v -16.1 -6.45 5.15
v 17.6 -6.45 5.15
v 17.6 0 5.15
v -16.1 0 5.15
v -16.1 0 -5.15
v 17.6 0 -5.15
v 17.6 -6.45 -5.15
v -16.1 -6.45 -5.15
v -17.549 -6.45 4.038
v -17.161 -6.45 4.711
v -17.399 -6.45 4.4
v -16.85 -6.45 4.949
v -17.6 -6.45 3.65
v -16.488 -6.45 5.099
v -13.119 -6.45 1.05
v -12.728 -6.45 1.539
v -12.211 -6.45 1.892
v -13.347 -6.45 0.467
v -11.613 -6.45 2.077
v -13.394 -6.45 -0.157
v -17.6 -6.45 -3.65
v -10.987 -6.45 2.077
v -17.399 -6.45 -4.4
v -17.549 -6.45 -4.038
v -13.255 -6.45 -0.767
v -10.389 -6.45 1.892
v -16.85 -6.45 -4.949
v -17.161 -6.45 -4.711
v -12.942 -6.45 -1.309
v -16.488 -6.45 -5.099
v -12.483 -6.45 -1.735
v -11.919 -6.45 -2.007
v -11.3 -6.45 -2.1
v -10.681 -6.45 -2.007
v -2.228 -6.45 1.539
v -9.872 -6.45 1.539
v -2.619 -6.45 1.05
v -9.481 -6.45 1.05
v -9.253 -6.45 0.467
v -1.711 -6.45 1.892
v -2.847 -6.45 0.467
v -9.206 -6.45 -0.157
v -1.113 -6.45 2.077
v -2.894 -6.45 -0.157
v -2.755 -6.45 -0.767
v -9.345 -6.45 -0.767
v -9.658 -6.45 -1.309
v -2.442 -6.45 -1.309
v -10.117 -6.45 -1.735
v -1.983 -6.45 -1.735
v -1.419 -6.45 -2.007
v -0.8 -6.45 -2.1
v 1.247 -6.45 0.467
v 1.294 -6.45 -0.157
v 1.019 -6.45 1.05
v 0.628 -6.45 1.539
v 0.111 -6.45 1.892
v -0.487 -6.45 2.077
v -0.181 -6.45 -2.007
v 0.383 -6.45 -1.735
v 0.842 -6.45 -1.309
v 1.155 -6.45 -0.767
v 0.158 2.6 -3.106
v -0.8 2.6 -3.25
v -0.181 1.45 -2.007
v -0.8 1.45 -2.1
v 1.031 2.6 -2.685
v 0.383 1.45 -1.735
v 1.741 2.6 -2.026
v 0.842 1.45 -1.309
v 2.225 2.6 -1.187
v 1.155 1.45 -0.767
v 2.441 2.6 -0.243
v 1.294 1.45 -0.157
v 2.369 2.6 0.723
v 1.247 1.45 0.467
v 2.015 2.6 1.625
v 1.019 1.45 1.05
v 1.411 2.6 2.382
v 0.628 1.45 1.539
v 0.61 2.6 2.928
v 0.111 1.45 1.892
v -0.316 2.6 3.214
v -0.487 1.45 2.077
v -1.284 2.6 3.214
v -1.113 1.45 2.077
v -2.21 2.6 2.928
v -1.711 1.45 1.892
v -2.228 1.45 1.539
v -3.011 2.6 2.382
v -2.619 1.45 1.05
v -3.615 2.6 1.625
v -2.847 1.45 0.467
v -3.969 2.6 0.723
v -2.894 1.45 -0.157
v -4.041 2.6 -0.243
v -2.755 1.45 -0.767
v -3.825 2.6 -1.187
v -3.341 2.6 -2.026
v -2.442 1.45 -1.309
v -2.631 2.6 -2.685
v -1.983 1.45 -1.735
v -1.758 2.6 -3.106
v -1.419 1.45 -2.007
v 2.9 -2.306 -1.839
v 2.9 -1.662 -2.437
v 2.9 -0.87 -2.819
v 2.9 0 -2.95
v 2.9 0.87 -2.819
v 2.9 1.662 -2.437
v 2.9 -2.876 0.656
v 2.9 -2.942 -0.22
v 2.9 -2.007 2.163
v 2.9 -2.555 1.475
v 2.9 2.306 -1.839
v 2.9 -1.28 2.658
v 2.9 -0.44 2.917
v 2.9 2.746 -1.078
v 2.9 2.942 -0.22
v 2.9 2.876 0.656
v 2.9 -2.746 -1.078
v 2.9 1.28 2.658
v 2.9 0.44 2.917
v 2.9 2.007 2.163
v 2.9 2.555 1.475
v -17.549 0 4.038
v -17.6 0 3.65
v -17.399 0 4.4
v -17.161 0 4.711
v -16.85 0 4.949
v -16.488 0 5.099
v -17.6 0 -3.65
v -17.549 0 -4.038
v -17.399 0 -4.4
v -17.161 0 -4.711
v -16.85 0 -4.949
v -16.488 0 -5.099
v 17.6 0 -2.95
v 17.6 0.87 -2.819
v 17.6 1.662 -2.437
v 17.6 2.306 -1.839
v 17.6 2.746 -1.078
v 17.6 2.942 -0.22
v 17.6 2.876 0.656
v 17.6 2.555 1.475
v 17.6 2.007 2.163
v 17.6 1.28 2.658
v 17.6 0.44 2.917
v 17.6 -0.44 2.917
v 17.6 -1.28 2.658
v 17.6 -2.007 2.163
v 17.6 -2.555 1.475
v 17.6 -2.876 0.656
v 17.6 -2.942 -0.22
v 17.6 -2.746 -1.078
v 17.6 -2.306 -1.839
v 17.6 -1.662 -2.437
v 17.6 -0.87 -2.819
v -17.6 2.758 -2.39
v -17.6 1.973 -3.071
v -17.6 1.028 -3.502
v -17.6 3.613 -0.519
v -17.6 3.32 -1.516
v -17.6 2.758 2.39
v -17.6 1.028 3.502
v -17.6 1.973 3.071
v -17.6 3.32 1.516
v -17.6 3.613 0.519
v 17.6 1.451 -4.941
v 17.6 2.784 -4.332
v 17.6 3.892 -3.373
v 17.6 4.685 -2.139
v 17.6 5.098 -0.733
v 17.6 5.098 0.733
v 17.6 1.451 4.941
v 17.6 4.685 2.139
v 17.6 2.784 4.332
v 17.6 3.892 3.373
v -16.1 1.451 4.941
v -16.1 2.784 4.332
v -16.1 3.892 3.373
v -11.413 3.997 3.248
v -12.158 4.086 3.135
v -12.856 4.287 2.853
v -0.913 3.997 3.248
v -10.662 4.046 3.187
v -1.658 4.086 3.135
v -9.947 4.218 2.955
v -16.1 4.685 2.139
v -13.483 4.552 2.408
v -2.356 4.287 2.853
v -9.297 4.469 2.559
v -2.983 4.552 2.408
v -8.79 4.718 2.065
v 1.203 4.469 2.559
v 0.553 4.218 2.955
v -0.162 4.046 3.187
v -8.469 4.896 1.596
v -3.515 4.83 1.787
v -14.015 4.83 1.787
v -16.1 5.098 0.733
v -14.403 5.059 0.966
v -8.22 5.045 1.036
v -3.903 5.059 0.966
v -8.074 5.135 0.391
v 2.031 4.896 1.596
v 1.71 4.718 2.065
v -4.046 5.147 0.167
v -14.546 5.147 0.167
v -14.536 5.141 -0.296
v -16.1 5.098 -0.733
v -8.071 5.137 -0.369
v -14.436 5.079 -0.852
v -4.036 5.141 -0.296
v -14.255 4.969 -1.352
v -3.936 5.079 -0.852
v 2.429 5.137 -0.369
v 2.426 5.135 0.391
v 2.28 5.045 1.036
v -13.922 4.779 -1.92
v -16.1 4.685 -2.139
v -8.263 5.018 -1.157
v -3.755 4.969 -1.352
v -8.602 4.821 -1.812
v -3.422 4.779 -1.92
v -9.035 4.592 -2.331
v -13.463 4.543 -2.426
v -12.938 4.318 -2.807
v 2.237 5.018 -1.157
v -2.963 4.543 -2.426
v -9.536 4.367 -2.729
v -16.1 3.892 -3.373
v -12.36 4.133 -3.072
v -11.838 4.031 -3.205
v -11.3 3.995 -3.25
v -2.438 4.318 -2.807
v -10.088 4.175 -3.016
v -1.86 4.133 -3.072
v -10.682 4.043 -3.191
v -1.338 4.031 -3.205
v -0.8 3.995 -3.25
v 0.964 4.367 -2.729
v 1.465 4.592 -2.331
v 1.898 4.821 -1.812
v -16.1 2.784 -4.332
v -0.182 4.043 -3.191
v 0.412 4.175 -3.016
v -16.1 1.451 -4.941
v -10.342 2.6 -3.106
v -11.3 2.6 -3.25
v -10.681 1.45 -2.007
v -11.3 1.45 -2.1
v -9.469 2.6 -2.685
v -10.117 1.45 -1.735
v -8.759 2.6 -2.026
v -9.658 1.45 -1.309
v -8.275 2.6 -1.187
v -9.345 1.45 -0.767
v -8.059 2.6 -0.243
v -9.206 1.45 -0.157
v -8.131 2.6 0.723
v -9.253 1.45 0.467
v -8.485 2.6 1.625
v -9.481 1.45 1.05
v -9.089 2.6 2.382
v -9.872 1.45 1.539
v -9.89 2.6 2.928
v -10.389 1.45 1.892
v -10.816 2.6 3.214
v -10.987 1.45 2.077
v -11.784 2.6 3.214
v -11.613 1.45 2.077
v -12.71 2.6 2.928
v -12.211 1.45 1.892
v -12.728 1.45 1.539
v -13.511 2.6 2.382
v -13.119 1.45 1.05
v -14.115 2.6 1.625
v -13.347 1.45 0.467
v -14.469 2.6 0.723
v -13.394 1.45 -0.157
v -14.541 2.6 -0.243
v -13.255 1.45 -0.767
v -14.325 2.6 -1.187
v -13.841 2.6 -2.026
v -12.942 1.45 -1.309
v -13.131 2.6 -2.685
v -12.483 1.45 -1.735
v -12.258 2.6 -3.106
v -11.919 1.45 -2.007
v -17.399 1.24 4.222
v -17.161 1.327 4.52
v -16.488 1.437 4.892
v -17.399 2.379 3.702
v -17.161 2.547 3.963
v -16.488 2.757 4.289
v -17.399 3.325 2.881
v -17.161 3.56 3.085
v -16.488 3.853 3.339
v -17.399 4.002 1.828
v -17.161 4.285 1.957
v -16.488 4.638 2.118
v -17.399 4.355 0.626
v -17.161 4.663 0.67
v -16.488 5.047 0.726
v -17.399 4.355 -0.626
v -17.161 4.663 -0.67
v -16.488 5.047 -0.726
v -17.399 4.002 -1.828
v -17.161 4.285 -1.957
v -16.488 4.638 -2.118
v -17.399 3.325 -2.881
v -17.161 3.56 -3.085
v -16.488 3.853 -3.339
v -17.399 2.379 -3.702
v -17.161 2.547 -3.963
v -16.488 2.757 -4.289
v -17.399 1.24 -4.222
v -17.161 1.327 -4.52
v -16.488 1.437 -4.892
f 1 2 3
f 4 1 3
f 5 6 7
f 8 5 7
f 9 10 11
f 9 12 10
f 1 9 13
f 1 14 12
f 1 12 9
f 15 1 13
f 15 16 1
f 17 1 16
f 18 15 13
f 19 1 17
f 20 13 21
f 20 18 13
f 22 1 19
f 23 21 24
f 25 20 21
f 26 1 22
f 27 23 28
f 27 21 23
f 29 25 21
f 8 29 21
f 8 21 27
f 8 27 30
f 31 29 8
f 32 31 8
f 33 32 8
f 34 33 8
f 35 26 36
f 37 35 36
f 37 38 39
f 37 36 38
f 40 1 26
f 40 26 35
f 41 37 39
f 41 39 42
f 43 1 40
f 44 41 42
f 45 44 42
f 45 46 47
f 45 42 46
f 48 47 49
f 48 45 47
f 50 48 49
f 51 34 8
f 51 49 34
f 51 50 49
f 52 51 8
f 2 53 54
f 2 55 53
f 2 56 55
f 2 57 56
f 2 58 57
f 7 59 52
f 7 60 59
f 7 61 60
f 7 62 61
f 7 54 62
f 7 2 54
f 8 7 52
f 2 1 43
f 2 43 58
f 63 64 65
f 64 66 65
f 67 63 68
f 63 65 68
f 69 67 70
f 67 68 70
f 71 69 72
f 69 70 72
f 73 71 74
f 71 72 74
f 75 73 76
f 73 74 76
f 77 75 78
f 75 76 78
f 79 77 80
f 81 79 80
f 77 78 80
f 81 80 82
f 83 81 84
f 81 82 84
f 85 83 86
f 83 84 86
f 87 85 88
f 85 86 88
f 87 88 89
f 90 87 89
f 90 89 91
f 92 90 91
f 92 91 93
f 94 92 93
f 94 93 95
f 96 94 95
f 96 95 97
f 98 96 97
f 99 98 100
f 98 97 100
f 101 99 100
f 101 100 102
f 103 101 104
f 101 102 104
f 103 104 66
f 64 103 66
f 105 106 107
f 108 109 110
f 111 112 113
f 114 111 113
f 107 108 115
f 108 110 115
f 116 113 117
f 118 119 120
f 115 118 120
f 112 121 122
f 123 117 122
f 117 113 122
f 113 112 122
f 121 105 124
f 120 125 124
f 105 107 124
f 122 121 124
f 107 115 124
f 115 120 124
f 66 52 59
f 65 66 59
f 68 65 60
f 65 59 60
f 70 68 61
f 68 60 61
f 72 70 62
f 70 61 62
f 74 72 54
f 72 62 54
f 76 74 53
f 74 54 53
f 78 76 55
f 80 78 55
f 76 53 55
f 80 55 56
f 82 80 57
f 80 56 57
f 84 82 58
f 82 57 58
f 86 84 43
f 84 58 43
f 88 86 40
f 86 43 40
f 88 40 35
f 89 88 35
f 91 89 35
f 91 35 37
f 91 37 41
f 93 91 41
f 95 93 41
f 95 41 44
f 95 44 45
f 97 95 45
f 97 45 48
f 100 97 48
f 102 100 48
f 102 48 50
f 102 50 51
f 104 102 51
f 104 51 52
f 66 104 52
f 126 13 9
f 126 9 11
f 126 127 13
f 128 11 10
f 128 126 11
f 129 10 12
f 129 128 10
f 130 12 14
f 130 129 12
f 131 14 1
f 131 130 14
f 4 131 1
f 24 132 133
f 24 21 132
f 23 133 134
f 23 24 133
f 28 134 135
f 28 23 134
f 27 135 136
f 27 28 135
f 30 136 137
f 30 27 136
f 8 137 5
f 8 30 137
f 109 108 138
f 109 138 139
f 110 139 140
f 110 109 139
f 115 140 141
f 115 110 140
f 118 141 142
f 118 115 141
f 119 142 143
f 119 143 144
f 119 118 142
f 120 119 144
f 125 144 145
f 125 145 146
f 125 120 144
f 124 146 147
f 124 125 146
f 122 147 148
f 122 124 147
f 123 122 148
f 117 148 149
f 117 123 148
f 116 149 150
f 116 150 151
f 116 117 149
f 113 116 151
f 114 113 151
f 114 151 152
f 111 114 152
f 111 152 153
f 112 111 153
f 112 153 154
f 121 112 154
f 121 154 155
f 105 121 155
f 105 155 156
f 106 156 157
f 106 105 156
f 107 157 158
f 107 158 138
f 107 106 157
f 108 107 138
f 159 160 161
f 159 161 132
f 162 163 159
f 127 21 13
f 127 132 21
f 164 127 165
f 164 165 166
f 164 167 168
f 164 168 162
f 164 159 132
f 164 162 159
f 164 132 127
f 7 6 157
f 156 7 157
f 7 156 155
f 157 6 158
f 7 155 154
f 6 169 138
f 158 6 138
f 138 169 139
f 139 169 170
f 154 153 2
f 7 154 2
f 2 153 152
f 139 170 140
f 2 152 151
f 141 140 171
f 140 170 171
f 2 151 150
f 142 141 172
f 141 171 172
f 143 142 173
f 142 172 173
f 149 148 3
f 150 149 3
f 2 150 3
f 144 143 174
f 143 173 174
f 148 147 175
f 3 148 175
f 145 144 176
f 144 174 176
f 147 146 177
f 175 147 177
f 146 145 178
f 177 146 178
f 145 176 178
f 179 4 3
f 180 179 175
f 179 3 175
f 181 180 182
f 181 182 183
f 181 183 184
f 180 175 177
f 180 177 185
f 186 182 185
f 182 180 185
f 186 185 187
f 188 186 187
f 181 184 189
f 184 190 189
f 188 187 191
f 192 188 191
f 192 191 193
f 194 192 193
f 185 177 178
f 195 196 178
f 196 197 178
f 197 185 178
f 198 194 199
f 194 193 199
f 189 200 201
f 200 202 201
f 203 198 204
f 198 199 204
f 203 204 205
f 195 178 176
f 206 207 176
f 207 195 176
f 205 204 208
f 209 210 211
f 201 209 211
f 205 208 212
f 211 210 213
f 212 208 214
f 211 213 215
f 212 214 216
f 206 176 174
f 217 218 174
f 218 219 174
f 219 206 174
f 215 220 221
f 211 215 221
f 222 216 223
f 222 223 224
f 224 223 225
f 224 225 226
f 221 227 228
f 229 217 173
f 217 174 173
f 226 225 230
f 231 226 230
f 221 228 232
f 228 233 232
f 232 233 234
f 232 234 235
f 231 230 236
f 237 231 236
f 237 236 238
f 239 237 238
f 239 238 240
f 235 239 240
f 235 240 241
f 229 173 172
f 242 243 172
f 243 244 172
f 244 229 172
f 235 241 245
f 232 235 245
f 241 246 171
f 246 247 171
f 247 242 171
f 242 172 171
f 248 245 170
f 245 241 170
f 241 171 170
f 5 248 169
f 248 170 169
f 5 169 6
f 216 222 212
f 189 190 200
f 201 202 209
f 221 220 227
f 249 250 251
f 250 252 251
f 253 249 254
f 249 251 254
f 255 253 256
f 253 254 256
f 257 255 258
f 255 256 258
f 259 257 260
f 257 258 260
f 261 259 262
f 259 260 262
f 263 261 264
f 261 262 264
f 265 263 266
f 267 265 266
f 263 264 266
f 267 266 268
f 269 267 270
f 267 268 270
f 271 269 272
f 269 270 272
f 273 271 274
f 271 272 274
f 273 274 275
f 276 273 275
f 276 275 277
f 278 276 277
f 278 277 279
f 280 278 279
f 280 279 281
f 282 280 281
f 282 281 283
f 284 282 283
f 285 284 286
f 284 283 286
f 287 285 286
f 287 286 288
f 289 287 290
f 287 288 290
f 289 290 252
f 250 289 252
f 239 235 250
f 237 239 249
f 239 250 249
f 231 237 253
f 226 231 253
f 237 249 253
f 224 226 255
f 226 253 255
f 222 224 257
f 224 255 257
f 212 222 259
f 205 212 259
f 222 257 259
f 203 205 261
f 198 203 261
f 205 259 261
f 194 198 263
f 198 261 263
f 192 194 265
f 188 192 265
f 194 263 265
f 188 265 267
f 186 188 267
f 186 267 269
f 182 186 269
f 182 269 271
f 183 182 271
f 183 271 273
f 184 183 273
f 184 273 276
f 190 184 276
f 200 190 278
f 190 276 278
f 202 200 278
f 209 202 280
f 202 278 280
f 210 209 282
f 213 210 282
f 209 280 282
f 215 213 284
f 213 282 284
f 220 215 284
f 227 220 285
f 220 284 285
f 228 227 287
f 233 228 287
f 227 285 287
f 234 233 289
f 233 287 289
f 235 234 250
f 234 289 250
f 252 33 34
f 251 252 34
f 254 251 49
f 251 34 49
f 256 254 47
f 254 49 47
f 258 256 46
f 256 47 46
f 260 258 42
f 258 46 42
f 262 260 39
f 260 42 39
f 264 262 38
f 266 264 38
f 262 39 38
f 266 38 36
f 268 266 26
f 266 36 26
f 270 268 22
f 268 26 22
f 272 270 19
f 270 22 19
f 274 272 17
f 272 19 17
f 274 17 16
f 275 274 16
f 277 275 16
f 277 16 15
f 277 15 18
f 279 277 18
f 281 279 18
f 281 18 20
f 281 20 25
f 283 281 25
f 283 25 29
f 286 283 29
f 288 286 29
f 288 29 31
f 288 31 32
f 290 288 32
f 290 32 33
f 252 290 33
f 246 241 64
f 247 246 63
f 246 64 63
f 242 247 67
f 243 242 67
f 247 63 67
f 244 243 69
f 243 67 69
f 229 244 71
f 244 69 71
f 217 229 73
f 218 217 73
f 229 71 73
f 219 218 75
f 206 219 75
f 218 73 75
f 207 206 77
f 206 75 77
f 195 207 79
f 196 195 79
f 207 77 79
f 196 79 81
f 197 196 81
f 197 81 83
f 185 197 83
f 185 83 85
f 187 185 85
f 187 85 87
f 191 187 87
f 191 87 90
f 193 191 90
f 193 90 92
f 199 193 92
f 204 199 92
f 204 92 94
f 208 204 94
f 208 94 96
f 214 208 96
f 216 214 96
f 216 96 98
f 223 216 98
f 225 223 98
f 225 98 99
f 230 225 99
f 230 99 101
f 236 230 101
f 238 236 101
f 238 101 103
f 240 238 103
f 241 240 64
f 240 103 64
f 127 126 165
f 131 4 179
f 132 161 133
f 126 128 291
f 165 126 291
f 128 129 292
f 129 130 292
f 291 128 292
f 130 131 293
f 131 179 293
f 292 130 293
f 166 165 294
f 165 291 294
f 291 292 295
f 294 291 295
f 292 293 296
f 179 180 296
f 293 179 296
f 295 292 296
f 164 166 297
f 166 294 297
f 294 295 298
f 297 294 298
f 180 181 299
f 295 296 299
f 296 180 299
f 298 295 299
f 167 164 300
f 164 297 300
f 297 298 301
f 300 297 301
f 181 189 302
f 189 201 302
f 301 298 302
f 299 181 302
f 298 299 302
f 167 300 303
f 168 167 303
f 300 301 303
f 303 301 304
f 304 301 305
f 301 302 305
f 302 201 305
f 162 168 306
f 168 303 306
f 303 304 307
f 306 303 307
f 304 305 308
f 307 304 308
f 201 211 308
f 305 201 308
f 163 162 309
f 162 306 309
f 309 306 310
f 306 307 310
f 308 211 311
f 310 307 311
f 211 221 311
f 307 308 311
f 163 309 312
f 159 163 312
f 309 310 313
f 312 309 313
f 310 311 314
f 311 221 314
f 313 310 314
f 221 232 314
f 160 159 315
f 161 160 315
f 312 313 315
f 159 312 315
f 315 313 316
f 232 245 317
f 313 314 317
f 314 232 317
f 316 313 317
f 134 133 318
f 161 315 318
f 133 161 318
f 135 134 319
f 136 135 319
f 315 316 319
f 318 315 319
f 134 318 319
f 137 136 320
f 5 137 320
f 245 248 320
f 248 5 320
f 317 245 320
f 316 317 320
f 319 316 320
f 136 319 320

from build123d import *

# Parameters (mm, degrees)
ESBO_O1_R                = 2.95
RESSALTO_EXTRUS_O1_DEPTH = 17.6
RESSALTO_EXTRUS_O2_START = -20.5
RESSALTO_EXTRUS_O2_DEPTH = 20.5
FILETE1_R                = 1.5
ESBO_O3_R                = 3.25
CORTE_EXTRUS_O1_DEPTH    = 22.699009104
ESBO_O5_R                = 3.25
ESBO_O5_R_2              = 2.1
RESSALTO_EXTRUS_O3_DEPTH = 9.1
CHANFRO1_SIZE            = 1.2


with BuildPart() as part:
    # Esboço1 → Ressalto-extrusão1 (new, symmetric)
    with BuildSketch(Plane(origin=(0, 0, 0), x_dir=(0, 0, -1), z_dir=(1, 0, 0))):
        with BuildLine():
            Line((5.15, -6.450193796), (-5.15, -6.450193796))
            Line((-5.15, -6.450193796), (-5.15, 0))
            ThreePointArc((-5.15, 0), (0, 5.15), (5.15, 0))
            Line((5.15, 0), (5.15, -6.450193796))
        make_face()
        Circle(ESBO_O1_R, mode=Mode.SUBTRACT)
    extrude(amount=RESSALTO_EXTRUS_O1_DEPTH, both=True)

    # Esboço2 → Ressalto-extrusão2 (add)
    with BuildSketch(Plane.ZY.offset(17.6).offset(RESSALTO_EXTRUS_O2_START)):
        with BuildLine():
            Line((-5.15, 0), (-5.15, -6.450193796))
            Line((-5.15, -6.450193796), (5.15, -6.450193796))
            Line((5.15, -6.450193796), (5.15, 0))
            ThreePointArc((5.15, 0), (0, 5.15), (-5.15, 0))
        make_face()
    extrude(amount=RESSALTO_EXTRUS_O2_DEPTH)

    # Filete1
    filete1_edges = [part.edges().sort_by_distance(p)[0] for p in [
        (-17.6, -3.225096898, -5.15),
        (-17.6, -3.225096898, 5.15),
        (-17.6, 5.15, 0),
    ]]
    fillet(filete1_edges, radius=FILETE1_R)

    # Esboço3 → Corte-extrusão1 (cut, through all)
    with BuildSketch(Plane.XZ.offset(6.450193796)):
        with Locations(Location((-11.3, 0, 0), (0, 0, 270))):
            Circle(ESBO_O3_R)
        with Locations(Location((-0.8, 0, 0), (0, 0, 270))):
            Circle(ESBO_O3_R)
    extrude(amount=-CORTE_EXTRUS_O1_DEPTH, mode=Mode.SUBTRACT)

    # Esboço5 → Ressalto-extrusão3 (add)
    # profile 1 of 2: a face of its own
    with BuildSketch(Plane.XZ.offset(6.450193796)):
        with Locations(Location((-0.8, 0, 0), (0, 0, 270))):
            Circle(ESBO_O5_R)
        with Locations(Location((-0.8, 0, 0), (0, 0, 270))):
            Circle(ESBO_O5_R_2, mode=Mode.SUBTRACT)
    # profile 2 of 2: a face of its own
    with BuildSketch(Plane.XZ.offset(6.450193796)):
        with Locations(Location((-11.3, 0, 0), (0, 0, 270))):
            Circle(ESBO_O5_R)
        with Locations(Location((-11.3, 0, 0), (0, 0, 270))):
            Circle(ESBO_O5_R_2, mode=Mode.SUBTRACT)
    extrude(amount=-RESSALTO_EXTRUS_O3_DEPTH)

    # Chanfro1
    # the kernel refuses this chamfer: 1.2 mm, written as the material it takes off along each edge
    with BuildSketch(Plane(origin=(-11.3, 2.649806204, 0), x_dir=(0, 0, -1), z_dir=(-1, 0, 0))) as chanfro1_piece_1_section:
        Polygon((2.1 + CHANFRO1_SIZE, 0), (2.1, CHANFRO1_SIZE), (2.1, 0), align=None)
    chanfro1_piece_1 = revolve(axis=Axis((-11.3, 2.649806204, 0), (0, -1, 0)), mode=Mode.PRIVATE)
    chanfro1_piece_1 = chanfro1_piece_1 & Plane(origin=(-11.3, 2.024165302, 0), x_dir=(0, 0, -1), z_dir=(0, -1, 0)) * Cylinder(3.25, 14, mode=Mode.PRIVATE)
    add(chanfro1_piece_1, mode=Mode.SUBTRACT)
    with BuildSketch(Plane(origin=(-0.8, 2.649806204, 0), x_dir=(0, 0, -1), z_dir=(-1, 0, 0))) as chanfro1_piece_2_section:
        Polygon((2.1 + CHANFRO1_SIZE, 0), (2.1, CHANFRO1_SIZE), (2.1, 0), align=None)
    chanfro1_piece_2 = revolve(axis=Axis((-0.8, 2.649806204, 0), (0, -1, 0)), mode=Mode.PRIVATE)
    chanfro1_piece_2 = chanfro1_piece_2 & Plane(origin=(-0.8, 2.024165302, 0), x_dir=(0, 0, -1), z_dir=(0, -1, 0)) * Cylinder(3.25, 14, mode=Mode.PRIVATE)
    add(chanfro1_piece_2, mode=Mode.SUBTRACT)


solid = part.part
